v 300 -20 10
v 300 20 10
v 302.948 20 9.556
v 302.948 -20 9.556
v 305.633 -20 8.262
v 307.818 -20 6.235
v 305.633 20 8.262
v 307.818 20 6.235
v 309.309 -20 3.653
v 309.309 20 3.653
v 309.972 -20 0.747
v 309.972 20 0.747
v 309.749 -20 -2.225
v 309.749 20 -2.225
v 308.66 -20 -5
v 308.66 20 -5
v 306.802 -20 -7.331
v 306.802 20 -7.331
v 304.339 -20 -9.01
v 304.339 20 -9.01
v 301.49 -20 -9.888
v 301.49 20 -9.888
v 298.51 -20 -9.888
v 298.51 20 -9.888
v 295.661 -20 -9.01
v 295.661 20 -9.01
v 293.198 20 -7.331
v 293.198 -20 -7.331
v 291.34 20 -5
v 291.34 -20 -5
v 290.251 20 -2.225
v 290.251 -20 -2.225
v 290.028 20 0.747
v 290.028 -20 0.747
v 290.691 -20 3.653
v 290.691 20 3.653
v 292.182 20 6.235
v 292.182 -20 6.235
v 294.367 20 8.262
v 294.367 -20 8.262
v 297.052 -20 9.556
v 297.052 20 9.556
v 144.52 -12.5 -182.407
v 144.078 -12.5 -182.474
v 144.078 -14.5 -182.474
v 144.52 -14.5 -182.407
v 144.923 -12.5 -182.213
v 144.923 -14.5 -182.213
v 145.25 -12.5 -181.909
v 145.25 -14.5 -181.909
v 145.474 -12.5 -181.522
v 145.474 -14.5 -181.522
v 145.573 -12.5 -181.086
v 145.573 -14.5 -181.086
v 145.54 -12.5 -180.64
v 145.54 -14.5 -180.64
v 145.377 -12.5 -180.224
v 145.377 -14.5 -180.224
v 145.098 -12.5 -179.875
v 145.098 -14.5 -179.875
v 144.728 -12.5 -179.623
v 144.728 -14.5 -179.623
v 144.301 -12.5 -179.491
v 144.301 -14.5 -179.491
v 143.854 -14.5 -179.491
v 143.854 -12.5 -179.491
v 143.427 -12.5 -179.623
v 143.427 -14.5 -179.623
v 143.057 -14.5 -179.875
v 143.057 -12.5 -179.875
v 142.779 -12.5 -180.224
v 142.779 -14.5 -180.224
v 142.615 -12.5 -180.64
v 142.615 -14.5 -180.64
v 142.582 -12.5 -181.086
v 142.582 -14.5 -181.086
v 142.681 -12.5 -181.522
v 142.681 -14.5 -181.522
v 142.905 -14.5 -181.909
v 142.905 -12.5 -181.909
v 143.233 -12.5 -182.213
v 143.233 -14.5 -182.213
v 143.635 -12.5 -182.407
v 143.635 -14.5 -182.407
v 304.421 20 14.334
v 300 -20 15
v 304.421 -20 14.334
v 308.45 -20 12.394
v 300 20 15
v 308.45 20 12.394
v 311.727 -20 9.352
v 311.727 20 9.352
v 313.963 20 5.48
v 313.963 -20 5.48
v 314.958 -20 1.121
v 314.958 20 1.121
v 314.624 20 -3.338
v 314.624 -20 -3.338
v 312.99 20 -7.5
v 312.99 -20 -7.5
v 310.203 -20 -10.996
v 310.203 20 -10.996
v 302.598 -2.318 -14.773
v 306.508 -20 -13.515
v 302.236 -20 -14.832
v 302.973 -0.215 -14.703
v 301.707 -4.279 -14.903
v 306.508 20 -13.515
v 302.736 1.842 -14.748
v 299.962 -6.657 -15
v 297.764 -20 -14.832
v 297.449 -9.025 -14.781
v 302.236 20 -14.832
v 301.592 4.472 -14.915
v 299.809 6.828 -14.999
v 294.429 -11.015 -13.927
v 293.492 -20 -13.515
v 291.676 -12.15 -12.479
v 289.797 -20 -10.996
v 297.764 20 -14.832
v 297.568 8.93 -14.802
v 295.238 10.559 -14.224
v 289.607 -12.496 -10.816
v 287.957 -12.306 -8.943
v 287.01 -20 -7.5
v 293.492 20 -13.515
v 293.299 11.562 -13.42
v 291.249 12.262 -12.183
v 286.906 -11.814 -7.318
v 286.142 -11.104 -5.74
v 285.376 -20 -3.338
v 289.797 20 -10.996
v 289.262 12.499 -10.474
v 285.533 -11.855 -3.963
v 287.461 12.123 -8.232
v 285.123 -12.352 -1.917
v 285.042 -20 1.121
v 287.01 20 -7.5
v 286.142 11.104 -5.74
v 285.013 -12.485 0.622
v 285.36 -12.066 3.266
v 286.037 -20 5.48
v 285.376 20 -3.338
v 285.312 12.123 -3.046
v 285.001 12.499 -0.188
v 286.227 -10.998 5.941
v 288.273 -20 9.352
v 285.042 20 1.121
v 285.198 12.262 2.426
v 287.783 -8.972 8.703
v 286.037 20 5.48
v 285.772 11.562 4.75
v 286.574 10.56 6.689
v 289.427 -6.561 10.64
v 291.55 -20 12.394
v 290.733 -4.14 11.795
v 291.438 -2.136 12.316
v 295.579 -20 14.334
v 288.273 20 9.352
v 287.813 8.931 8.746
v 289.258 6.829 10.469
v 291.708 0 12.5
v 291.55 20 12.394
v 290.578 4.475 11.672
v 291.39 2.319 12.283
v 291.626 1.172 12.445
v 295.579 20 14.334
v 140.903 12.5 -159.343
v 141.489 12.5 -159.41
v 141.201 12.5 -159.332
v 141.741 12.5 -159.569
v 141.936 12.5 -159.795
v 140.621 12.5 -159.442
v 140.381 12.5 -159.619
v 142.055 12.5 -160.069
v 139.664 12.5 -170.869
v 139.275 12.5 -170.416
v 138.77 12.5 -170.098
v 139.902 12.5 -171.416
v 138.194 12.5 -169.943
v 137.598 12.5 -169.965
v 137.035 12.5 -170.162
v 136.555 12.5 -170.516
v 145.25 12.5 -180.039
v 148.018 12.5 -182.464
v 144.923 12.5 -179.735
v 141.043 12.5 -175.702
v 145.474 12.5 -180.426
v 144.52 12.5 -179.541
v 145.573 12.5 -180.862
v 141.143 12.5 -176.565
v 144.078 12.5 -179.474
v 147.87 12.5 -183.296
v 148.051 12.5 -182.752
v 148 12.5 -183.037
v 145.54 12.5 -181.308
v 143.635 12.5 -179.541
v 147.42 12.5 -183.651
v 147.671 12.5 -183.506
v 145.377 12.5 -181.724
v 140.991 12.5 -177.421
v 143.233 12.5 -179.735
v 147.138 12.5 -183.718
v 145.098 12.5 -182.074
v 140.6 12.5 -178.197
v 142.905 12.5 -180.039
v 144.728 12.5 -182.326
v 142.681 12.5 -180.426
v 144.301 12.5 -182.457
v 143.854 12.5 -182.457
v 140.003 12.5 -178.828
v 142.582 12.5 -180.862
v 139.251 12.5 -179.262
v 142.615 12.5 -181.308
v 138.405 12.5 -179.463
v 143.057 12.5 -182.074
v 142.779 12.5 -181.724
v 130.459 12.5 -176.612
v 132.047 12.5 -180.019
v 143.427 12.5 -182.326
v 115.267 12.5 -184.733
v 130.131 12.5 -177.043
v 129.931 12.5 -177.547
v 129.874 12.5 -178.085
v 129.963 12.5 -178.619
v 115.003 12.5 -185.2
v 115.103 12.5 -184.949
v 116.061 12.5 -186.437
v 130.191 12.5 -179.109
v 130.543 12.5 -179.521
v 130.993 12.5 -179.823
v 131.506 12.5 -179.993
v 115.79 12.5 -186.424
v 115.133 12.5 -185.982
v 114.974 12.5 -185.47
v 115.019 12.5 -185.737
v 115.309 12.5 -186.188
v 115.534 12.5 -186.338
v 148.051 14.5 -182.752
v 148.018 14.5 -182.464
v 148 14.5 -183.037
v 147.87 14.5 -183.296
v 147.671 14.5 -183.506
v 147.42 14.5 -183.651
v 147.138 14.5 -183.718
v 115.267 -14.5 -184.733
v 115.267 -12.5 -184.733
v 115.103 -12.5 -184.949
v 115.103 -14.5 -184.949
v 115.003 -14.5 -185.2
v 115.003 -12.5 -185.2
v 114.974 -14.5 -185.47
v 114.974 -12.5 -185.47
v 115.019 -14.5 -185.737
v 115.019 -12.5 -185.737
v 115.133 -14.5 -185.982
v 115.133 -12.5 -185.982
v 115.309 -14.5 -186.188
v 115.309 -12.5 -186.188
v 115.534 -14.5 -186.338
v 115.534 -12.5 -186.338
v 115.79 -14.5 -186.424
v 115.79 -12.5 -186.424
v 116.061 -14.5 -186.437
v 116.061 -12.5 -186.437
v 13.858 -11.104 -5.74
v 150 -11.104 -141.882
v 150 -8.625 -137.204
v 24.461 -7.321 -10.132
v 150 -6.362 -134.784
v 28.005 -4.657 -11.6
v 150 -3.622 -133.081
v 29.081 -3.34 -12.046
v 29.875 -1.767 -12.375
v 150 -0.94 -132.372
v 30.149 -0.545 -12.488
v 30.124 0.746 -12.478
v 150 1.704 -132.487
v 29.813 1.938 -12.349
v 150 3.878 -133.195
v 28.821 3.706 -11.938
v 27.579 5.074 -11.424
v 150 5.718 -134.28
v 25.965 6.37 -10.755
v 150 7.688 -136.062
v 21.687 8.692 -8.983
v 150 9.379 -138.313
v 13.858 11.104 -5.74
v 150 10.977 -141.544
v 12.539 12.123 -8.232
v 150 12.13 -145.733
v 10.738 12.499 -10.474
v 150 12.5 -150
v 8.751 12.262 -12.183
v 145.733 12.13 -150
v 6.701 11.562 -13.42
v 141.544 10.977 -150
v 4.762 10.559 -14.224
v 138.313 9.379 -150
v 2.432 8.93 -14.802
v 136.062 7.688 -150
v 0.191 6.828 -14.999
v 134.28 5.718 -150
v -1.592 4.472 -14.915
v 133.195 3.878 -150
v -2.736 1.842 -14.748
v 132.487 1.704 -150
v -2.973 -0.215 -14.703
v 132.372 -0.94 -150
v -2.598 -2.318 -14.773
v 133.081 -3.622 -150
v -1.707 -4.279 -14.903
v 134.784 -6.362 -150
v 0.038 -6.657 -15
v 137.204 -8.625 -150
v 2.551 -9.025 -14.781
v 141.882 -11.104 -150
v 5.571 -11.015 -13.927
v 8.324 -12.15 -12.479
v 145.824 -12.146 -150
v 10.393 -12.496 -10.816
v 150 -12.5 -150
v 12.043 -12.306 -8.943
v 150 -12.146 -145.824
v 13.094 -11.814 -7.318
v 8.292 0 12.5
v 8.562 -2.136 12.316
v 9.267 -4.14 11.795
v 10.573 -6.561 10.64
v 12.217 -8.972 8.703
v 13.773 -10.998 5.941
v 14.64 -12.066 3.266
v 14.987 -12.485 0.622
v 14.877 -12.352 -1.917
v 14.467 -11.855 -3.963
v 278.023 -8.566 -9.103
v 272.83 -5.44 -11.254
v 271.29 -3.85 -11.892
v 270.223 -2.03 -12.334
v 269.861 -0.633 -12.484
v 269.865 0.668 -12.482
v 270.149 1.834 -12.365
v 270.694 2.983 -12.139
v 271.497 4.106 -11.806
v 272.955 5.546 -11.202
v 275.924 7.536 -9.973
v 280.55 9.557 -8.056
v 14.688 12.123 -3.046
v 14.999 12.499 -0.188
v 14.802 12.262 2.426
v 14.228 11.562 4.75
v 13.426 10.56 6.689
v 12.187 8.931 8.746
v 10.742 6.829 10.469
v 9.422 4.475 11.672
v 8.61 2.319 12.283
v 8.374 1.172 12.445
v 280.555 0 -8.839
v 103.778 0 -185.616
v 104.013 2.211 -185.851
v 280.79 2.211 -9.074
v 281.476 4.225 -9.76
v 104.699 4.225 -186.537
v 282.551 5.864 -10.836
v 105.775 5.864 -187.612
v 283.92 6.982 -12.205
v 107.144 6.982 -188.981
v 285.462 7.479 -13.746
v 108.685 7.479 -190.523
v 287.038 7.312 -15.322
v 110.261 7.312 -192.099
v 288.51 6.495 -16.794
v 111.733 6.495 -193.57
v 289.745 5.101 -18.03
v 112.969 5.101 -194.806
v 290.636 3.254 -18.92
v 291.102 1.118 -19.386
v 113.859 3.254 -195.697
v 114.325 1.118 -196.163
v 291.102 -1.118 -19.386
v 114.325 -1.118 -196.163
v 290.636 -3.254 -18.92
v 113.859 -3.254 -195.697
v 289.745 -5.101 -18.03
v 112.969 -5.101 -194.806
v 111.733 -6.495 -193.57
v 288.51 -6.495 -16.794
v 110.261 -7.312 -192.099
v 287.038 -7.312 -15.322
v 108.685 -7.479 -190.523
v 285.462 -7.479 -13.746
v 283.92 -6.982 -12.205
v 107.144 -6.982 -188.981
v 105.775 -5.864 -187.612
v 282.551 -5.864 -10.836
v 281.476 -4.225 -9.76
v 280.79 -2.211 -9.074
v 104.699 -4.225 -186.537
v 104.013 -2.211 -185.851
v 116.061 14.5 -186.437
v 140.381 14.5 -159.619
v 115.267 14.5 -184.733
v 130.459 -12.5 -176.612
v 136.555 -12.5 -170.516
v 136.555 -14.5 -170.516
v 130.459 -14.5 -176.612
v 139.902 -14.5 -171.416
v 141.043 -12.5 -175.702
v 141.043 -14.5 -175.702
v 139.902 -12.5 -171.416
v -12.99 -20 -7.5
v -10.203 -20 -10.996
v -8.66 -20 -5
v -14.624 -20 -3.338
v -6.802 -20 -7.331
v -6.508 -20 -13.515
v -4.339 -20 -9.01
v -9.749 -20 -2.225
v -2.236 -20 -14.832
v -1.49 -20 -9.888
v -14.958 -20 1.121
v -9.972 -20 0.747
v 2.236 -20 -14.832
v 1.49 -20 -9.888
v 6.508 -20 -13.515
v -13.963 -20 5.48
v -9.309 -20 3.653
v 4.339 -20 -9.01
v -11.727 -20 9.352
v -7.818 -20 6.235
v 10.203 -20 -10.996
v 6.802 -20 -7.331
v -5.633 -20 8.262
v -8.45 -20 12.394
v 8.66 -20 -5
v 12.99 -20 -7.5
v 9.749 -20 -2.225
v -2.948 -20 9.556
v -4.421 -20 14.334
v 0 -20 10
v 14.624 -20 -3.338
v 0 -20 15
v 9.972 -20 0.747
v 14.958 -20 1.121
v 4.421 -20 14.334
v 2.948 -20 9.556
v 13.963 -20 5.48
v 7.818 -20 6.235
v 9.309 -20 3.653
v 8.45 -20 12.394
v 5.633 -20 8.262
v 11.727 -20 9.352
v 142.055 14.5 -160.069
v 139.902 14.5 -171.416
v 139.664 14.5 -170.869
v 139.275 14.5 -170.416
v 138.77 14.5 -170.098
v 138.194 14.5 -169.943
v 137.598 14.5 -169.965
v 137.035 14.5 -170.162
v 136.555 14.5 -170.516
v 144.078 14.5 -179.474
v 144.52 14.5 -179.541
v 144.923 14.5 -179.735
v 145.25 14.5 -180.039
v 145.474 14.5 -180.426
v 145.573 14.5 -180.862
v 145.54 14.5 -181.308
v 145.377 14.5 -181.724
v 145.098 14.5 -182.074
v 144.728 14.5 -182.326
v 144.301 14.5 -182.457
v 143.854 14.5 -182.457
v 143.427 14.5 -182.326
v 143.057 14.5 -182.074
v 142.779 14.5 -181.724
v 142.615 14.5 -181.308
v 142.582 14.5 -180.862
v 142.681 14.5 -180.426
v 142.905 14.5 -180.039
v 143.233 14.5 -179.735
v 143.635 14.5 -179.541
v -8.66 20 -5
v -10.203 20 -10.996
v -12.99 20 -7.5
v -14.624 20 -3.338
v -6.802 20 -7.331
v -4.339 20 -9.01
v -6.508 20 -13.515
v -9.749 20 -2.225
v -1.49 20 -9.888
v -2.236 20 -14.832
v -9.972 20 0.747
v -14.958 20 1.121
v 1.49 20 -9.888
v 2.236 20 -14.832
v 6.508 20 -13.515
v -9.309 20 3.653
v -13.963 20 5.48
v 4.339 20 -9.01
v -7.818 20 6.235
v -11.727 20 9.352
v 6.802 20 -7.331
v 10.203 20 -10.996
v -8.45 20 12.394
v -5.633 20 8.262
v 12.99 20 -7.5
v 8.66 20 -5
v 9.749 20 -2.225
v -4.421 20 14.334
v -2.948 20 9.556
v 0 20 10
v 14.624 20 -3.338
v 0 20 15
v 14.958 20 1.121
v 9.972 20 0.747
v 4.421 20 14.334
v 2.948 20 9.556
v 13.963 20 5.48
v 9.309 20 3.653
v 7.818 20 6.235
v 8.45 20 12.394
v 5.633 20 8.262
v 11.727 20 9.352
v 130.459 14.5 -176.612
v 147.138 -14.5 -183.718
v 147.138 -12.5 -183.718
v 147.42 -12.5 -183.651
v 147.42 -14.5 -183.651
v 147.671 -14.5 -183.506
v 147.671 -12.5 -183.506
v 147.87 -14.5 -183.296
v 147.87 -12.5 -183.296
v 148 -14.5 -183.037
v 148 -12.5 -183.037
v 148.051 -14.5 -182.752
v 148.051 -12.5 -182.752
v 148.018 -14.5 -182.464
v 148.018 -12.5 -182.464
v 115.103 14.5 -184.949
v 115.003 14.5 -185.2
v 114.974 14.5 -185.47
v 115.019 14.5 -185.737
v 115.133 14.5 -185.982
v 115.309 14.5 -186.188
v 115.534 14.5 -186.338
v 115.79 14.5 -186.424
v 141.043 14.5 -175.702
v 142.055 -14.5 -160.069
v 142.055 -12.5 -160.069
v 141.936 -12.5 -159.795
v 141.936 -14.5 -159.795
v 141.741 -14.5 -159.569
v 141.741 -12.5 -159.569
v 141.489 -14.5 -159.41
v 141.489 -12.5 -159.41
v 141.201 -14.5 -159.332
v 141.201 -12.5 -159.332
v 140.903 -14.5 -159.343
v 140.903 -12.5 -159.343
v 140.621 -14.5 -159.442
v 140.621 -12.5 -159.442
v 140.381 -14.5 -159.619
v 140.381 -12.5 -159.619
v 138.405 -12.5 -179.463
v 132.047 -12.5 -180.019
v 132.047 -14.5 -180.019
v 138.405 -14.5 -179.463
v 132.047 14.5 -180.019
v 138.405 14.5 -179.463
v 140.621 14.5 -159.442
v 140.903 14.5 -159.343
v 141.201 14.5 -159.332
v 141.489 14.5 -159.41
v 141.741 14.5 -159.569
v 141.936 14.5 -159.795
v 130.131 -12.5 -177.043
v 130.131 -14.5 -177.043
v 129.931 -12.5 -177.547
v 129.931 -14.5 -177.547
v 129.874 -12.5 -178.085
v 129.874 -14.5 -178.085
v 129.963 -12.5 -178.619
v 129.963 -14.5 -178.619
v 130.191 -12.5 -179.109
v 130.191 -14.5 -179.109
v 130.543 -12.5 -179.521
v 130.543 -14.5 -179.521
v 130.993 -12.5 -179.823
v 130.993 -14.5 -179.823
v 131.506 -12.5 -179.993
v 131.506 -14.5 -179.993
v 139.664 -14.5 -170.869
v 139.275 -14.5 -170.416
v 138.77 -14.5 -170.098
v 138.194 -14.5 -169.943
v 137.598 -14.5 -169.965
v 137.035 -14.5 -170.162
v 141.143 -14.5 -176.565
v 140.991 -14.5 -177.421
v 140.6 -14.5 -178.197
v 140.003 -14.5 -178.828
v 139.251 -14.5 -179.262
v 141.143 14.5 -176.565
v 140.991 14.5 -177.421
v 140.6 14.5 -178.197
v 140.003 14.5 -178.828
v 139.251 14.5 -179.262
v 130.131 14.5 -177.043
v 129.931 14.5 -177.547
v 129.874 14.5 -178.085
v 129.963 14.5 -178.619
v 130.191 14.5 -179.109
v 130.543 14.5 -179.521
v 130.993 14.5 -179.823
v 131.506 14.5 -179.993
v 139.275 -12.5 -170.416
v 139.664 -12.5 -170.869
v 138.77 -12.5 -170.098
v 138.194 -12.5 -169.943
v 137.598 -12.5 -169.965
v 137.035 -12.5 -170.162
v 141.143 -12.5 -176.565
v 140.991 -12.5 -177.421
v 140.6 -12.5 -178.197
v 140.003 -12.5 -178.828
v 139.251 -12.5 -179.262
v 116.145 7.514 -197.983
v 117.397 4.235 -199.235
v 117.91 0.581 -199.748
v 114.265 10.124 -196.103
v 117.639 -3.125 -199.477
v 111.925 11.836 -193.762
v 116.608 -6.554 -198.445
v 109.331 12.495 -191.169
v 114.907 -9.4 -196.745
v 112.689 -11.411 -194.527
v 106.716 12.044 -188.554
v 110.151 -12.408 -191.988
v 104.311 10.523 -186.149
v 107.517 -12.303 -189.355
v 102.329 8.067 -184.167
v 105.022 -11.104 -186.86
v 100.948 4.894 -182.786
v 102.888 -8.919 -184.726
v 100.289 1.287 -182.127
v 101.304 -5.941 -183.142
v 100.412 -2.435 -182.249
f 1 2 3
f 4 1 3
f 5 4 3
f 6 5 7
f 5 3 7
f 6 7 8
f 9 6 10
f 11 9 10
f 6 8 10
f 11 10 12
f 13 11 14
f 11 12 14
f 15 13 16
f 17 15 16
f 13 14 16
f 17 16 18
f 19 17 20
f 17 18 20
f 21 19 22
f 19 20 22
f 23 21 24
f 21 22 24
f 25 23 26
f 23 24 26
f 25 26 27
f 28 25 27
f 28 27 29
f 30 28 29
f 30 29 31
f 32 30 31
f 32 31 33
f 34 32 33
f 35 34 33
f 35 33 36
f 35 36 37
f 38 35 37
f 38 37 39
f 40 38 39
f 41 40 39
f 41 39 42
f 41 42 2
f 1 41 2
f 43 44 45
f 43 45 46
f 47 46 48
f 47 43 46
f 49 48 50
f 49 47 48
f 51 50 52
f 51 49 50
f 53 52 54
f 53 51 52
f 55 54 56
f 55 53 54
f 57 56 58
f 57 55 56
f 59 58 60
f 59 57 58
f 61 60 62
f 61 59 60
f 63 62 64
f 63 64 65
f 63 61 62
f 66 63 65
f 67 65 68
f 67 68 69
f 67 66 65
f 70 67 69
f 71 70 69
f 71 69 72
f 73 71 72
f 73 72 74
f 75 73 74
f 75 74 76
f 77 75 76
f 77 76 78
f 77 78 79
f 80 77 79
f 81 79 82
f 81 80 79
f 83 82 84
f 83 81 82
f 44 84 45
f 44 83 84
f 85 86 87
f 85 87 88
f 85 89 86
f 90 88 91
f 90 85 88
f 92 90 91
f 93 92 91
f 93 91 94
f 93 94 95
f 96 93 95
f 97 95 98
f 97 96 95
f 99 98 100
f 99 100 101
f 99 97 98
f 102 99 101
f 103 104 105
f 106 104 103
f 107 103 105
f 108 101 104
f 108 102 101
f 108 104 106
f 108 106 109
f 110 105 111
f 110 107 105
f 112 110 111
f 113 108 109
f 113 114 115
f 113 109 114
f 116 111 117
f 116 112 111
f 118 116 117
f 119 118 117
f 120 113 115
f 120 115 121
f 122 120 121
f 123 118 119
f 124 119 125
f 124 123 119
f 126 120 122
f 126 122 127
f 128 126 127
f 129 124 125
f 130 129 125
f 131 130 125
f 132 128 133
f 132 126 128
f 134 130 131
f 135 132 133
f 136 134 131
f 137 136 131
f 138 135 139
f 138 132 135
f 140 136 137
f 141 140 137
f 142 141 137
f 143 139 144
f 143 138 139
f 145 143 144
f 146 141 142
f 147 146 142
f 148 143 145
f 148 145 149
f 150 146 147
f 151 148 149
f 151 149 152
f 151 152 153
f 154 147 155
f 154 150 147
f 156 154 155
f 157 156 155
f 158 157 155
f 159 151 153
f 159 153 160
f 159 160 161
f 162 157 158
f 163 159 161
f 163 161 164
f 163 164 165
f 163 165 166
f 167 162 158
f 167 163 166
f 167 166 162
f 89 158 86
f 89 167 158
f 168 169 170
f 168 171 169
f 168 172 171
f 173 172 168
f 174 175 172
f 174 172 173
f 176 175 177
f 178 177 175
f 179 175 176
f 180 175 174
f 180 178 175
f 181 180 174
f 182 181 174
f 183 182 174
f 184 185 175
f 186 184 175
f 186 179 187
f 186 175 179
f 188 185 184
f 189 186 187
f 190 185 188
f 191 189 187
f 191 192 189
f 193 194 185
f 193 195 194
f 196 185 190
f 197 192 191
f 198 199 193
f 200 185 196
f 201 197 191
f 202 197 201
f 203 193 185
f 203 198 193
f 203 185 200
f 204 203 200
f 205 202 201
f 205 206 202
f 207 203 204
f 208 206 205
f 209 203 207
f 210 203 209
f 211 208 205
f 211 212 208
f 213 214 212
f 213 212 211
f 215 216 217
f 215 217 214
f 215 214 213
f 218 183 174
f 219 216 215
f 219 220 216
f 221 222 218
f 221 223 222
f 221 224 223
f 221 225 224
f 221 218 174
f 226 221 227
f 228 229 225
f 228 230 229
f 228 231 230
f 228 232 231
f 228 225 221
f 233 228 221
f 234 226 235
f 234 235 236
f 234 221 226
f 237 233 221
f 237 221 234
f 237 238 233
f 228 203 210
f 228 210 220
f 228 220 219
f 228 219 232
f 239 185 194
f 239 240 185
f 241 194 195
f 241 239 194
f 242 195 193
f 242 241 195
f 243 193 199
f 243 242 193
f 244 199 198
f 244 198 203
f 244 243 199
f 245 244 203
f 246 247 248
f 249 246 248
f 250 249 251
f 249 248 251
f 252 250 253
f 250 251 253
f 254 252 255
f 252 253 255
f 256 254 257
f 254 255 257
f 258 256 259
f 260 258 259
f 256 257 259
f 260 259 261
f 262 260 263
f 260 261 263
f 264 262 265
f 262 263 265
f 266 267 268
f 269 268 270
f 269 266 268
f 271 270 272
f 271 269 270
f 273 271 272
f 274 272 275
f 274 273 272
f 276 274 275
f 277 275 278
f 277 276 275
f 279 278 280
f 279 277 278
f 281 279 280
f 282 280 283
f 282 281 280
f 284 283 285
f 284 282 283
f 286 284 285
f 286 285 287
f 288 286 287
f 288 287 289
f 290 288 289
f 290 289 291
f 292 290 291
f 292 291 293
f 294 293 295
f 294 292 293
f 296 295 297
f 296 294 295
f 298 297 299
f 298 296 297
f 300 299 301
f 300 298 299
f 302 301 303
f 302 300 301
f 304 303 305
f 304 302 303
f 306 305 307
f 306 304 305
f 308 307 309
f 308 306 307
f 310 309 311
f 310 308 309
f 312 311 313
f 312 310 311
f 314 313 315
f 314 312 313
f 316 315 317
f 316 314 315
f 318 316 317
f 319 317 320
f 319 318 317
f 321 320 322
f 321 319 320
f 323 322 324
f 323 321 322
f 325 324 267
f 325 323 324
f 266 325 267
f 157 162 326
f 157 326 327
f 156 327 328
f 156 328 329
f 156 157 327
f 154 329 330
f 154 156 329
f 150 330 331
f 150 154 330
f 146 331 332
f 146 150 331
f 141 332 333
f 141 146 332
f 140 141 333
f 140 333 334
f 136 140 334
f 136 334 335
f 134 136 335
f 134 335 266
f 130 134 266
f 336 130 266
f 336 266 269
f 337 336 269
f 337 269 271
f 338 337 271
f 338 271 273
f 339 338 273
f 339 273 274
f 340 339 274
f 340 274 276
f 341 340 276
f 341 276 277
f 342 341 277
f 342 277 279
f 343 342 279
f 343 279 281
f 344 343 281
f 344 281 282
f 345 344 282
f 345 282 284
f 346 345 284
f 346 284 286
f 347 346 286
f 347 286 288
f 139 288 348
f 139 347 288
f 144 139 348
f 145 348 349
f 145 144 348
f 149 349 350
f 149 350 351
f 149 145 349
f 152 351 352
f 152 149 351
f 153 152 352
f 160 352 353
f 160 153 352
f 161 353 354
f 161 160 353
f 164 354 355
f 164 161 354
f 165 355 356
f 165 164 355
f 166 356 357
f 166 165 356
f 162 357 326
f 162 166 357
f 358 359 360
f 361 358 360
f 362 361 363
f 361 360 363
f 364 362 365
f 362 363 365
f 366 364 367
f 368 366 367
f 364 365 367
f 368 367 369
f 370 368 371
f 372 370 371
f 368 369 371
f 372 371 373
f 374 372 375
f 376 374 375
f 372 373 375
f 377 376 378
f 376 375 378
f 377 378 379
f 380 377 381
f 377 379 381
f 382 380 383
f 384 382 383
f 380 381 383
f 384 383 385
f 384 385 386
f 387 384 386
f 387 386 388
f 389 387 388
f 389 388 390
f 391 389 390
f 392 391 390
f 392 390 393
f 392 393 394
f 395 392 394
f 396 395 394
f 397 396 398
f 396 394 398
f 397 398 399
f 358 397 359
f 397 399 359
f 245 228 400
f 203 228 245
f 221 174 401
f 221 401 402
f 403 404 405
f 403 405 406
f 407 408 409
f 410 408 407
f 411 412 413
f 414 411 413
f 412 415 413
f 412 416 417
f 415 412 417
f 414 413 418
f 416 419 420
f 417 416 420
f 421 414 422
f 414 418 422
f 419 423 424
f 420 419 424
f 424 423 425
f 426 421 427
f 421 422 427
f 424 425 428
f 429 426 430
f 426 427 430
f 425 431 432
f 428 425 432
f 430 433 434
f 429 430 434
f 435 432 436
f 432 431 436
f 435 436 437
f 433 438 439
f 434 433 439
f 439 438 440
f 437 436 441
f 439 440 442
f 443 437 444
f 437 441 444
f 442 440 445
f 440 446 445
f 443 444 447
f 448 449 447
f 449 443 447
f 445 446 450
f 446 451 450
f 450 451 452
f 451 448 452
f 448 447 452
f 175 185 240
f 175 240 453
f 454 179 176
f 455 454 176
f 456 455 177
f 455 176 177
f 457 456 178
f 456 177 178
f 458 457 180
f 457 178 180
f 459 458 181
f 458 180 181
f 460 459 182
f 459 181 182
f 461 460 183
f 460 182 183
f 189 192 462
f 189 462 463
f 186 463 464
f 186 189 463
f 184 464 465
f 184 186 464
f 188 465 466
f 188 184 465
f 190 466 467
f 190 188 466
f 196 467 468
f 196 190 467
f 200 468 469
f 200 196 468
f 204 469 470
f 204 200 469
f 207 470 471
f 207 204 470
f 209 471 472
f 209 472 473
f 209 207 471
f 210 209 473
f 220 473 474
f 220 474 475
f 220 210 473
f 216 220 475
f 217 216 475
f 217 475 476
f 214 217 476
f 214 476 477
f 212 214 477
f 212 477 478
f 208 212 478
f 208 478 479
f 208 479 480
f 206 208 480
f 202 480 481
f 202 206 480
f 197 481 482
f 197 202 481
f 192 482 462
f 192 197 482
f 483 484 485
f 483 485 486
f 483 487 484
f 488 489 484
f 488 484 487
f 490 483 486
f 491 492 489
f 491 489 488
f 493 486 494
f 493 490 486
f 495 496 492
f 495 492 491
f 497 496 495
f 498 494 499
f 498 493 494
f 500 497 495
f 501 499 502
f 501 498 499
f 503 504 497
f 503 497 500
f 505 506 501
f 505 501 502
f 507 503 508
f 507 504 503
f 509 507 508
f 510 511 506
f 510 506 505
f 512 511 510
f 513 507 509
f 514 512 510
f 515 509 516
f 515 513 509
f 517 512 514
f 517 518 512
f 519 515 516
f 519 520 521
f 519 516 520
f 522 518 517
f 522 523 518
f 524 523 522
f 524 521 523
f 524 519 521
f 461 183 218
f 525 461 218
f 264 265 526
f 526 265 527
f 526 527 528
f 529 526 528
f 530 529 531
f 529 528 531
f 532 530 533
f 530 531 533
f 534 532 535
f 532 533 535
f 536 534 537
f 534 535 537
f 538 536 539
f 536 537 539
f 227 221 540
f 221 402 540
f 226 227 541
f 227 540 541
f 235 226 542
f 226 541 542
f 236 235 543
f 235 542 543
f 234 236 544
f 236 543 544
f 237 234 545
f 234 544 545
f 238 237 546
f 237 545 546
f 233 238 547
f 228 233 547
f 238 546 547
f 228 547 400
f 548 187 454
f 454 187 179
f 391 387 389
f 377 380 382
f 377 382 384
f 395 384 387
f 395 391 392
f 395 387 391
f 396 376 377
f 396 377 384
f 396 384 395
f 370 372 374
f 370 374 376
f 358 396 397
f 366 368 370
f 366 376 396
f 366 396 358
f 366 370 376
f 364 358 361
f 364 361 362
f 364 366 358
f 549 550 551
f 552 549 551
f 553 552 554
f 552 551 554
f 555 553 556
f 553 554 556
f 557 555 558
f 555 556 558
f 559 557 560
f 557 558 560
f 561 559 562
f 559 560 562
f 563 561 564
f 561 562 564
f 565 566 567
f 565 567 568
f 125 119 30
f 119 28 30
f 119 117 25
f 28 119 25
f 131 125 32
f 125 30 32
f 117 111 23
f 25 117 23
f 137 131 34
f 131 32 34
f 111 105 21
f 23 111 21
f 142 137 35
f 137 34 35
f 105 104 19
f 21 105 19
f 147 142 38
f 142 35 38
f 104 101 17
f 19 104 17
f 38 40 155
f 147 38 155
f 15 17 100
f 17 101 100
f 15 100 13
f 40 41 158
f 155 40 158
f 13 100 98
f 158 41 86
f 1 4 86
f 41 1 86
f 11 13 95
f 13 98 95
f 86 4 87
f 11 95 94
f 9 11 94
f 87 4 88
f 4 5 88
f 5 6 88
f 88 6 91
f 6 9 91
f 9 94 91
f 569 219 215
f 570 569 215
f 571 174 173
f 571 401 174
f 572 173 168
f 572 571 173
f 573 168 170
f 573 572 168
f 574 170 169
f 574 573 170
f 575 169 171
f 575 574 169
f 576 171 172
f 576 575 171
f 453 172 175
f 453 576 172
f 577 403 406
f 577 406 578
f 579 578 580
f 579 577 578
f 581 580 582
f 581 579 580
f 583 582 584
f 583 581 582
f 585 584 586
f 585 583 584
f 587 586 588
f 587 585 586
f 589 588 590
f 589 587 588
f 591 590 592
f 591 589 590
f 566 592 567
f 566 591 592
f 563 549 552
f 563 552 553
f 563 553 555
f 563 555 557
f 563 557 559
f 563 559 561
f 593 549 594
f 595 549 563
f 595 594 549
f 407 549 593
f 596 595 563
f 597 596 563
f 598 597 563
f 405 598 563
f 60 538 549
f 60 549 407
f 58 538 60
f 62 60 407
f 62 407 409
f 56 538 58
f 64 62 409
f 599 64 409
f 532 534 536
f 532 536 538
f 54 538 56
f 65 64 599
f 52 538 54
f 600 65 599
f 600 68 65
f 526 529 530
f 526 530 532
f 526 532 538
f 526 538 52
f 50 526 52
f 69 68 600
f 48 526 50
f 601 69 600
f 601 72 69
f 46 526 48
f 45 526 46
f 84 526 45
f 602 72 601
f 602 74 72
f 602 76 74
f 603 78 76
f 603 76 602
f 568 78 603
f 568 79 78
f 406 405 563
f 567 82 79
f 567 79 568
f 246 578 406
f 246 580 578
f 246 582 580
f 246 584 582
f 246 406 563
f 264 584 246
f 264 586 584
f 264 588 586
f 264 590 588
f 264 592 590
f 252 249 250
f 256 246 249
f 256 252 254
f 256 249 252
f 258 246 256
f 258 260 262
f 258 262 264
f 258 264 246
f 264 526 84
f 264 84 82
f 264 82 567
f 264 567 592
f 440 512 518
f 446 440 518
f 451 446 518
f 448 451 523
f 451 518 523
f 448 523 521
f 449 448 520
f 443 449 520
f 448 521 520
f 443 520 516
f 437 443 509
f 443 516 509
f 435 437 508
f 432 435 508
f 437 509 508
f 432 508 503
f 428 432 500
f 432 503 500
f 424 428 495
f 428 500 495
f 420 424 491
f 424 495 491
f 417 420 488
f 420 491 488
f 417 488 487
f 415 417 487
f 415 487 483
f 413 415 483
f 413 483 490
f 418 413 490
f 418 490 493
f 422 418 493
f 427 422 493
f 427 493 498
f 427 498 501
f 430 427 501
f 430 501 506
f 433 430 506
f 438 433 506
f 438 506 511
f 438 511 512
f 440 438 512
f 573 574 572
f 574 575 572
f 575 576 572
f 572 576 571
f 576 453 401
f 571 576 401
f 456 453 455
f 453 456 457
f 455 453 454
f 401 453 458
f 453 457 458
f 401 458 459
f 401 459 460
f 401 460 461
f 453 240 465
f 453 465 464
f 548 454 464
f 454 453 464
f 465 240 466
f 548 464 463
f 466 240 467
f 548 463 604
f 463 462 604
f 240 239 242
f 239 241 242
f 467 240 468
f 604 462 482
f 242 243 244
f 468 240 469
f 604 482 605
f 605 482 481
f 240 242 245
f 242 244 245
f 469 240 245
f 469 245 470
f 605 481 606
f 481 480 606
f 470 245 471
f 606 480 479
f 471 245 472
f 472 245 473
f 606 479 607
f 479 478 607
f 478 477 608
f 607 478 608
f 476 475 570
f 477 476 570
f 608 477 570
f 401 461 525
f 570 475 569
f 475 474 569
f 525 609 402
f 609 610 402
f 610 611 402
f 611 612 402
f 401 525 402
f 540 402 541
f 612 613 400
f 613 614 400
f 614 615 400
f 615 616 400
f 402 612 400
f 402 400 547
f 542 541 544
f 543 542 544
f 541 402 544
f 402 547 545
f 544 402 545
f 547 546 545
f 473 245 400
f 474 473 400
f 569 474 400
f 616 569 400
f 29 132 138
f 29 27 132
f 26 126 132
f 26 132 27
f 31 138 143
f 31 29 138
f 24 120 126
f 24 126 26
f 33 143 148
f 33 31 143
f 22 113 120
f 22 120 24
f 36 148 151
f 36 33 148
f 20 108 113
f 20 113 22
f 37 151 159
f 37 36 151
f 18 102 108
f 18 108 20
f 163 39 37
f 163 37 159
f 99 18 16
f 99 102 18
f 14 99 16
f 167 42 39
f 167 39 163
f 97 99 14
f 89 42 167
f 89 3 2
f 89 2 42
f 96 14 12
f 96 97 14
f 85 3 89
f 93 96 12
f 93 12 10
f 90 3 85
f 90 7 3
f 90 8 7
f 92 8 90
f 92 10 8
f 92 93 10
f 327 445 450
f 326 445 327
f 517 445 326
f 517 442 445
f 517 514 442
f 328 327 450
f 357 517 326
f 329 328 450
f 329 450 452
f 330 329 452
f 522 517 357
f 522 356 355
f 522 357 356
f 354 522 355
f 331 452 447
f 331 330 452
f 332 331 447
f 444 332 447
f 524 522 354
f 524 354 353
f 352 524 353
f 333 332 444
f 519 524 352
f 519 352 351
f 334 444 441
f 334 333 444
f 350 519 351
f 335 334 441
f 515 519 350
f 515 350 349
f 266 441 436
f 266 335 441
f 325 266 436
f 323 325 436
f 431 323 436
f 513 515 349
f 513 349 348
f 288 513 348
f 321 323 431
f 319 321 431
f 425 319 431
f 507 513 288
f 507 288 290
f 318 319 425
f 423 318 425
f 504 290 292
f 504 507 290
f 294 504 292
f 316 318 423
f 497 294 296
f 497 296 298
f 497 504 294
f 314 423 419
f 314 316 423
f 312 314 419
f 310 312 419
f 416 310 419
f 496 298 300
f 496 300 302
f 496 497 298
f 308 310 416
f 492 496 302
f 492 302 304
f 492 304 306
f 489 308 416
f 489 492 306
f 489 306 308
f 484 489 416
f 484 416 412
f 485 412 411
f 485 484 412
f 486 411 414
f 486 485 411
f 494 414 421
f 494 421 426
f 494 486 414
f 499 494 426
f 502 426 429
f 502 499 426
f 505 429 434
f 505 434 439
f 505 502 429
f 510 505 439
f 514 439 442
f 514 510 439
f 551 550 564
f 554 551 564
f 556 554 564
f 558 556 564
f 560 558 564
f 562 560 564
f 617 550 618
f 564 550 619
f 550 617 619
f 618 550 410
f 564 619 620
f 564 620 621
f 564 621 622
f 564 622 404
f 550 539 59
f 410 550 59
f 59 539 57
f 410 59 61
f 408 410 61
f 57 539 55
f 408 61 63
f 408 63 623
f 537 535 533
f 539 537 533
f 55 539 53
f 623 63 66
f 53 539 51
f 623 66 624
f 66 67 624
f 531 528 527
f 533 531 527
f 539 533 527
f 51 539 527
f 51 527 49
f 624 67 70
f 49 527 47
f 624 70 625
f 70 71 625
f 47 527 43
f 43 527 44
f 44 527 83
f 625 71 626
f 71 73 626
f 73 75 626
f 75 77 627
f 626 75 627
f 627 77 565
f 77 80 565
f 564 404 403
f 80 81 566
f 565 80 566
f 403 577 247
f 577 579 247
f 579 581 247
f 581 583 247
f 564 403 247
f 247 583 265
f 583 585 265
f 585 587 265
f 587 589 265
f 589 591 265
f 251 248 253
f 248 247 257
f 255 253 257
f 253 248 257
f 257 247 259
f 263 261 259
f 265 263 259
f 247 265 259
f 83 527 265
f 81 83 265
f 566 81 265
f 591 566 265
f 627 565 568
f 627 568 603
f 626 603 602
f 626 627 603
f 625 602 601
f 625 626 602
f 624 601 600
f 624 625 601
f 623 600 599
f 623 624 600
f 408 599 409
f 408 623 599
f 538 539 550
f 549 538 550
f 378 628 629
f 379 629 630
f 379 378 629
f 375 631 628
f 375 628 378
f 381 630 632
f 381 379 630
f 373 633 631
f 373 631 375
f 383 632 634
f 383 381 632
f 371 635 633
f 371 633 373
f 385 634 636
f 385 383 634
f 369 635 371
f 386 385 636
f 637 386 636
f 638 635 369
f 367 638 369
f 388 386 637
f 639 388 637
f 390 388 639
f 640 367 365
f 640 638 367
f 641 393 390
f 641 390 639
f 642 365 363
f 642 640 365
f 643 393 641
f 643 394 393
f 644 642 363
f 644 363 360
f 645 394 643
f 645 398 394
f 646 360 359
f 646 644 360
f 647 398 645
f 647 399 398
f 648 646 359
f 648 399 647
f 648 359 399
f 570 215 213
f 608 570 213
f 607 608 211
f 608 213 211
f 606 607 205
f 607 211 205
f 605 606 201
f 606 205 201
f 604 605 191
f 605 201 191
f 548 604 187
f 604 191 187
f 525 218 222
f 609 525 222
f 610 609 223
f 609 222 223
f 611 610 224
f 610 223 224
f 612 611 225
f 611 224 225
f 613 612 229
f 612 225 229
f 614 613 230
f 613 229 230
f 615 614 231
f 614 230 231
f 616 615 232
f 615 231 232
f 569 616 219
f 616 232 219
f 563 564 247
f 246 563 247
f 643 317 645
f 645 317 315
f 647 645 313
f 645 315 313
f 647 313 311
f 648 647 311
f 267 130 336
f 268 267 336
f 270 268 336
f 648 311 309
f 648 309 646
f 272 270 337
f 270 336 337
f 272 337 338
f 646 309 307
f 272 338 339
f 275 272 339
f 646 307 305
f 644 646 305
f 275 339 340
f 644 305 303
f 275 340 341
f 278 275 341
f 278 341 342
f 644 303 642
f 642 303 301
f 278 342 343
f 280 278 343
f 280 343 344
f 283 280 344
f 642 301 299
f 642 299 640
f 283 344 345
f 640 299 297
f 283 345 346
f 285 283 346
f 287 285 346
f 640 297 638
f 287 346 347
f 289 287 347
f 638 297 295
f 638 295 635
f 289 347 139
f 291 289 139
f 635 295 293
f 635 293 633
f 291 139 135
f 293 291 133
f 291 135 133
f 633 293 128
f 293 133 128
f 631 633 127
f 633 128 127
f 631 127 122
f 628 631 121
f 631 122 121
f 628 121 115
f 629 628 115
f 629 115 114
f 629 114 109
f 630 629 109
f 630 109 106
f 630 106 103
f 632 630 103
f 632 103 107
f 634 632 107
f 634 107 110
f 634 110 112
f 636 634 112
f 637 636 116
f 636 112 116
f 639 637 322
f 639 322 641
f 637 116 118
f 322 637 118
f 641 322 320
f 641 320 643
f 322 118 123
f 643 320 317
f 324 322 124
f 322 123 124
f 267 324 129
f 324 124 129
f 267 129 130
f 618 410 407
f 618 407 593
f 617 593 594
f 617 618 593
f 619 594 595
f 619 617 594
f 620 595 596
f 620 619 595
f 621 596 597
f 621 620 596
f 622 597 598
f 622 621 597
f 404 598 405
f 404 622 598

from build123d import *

# Parameters (mm, degrees)
CROQUIS1_R              = 15
SALIENTE_EXTRUIR1_DEPTH = 20
CROQUIS9_R              = 15
SALIENTE_EXTRUIR5_DEPTH = 20
CROQUIS10_W             = 300
CROQUIS10_H             = 12.5
CROQUIS12_R             = 12.5
SALIENTE_EXTRUIR6_DEPTH = 270
CROQUIS18_R             = 10
CORTAR_EXTRUIR1_DEPTH   = 376.137474949
CROQUIS19_R             = 1.5
SALIENTE_EXTRUIR7_DEPTH = 2
REDONDEO1_R             = 1
CROQUIS20_R             = 1.5
SALIENTE_EXTRUIR8_DEPTH = 2
CROQUIS21_R             = 7.5
CORTAR_EXTRUIR2_DEPTH   = 250


with BuildPart() as part:
    # Croquis1 → Saliente-Extruir1 (new, symmetric)
    with BuildSketch(Plane(origin=(0, 0, 0), x_dir=(1, 0, 0), z_dir=(0, 1, 0))):
        with Locations(Location((0, 0, 0), (0, 0, 270))):
            Circle(CROQUIS1_R)
    extrude(amount=SALIENTE_EXTRUIR1_DEPTH, both=True)



with BuildPart() as body_2:
    # Croquis9 → Saliente-Extruir5 (new, symmetric)
    with BuildSketch(Plane(origin=(0, 0, 0), x_dir=(1, 0, 0), z_dir=(0, 1, 0))):
        with Locations(Location((300, 0, 0), (0, 0, 270))):
            Circle(CROQUIS9_R)
    extrude(amount=SALIENTE_EXTRUIR5_DEPTH, both=True)


with BuildPart() as part_1:
    add(part.part)

    add(body_2.part)  # Revolución1 merges body 2
    # Croquis10 → Revolución1 (revolve)
    with BuildSketch(Plane.XY, mode=Mode.PRIVATE) as revoluci_n1_sk:
        with Locations((150, 6.25)):
            Rectangle(CROQUIS10_W, CROQUIS10_H)
    revolve(revoluci_n1_sk.sketch.rotate(Axis((0, 0, 0), (1, 0, 0)), 90), axis=Axis((0, 0, 0), (1, 0, 0)))

    # Croquis12 → Saliente-Extruir6 (add)
    with BuildSketch(Plane(origin=(150, 0, 150), x_dir=(-0.7071067811865456, 0, 0.7071067811865495), z_dir=(-0.7071067811865495, 0, -0.7071067811865456))):
        with Locations(Location((-212.132034356, 0, 0), (0, 0, 297.336794427))):
            Circle(CROQUIS12_R)
    extrude(amount=SALIENTE_EXTRUIR6_DEPTH)

    # Croquis17 → Revolución2 (revolve)
    with BuildSketch(Plane(origin=(0, 0, 0), x_dir=(1, 0, 0), z_dir=(0, 1, 0)), mode=Mode.PRIVATE) as revoluci_n2_sk:
        Polygon((-8.838834765, 8.838834765), (0, 0), (150, 150), (141.161165235, 158.838834765), align=None)
    revolve(revoluci_n2_sk.sketch.rotate(Axis((150, 0, -150), (-0.7071067811865455, 0, 0.7071067811865497)), 117.336794427), axis=Axis((150, 0, -150), (-0.7071067811865455, 0, 0.7071067811865497)))

    # Croquis18 → Cortar-Extruir1 (cut, through all)
    with BuildSketch(Plane(origin=(0, 20, 0), x_dir=(1, 0, 0), z_dir=(0, 1, 0))):
        with Locations(Location((0, 0, 0), (0, 0, 270))):
            Circle(CROQUIS18_R)
        with Locations(Location((300, 0, 0), (0, 0, 270))):
            Circle(CROQUIS18_R)
    extrude(amount=-CORTAR_EXTRUIR1_DEPTH, mode=Mode.SUBTRACT)

    # Croquis21 → Cortar-Extruir2 (cut)
    with BuildSketch(Plane(origin=(-40.91883092, 0, -40.91883092), x_dir=(-0.7071067811865456, 0, 0.7071067811865495), z_dir=(-0.7071067811865495, 0, -0.7071067811865456))):
        with Locations((-212.132034356, 0)):
            Circle(CROQUIS21_R)
    extrude(amount=-CORTAR_EXTRUIR2_DEPTH, mode=Mode.SUBTRACT)


with BuildPart() as body_2_2:
    # Croquis19 → Saliente-Extruir7 (new body)
    with BuildSketch(Plane(origin=(0, 12.5, 0), x_dir=(1, 0, 0), z_dir=(0, 1, 0))):
        Polygon((141.608081014, 158.391918986), (113.323809767, 186.676190233), (148.323809767, 183.61408701), align=None)
        with Locations(Location((144.077563746, 180.974125887, 0), (0, 0, 270))):
            Circle(CROQUIS19_R, mode=Mode.SUBTRACT)
        with BuildLine():
            Line((132.047188122, 180.019007697), (138.405447562, 179.462732076))
            ThreePointArc((138.405447562, 179.462732076), (140.600081534, 178.196810716), (141.042976329, 175.702252769))
            Line((141.042976329, 175.702252769), (139.90167578, 171.415886345))
            ThreePointArc((139.90167578, 171.415886345), (138.488170033, 169.999039468), (136.55479822, 170.516269591))
            Line((136.55479822, 170.516269591), (130.458663074, 176.612404738))
            ThreePointArc((130.458663074, 176.612404738), (130.060261062, 178.871854824), (132.047188122, 180.019007697))
        make_face(mode=Mode.SUBTRACT)
    extrude(amount=SALIENTE_EXTRUIR7_DEPTH)

    # Redondeo1
    redondeo1_edges = [body_2_2.edges().sort_by_distance(p)[0] for p in [
        (113.323809767, 13.5, -186.676190233),
        (148.323809767, 13.5, -183.61408701),
        (141.608081014, 13.5, -158.391918986),
    ]]
    fillet(redondeo1_edges, radius=REDONDEO1_R)


with BuildPart() as body_3:
    # Croquis20 → Saliente-Extruir8 (new body)
    with BuildSketch(Plane(origin=(0, -12.5, 0), x_dir=(-1, 0, 0), z_dir=(0, -1, 0))):
        with BuildLine():
            Line((-116.060832205, 186.436731798), (-147.13848683, 183.717789329))
            ThreePointArc((-147.13848683, 183.717789329), (-147.870031487, 183.295815543), (-148.017663086, 182.464296227))
            Line((-148.017663086, 182.464296227), (-142.05454598, 160.068701177))
            ThreePointArc((-142.05454598, 160.068701177), (-141.347793106, 159.360277738), (-140.3811072, 159.6188928))
            Line((-140.3811072, 159.6188928), (-115.266569681, 184.733430319))
            ThreePointArc((-115.266569681, 184.733430319), (-115.067368675, 185.863155362), (-116.060832205, 186.436731798))
        make_face()
        with Locations(Location((-144.077563746, 180.974125887, 0), (0, 0, 90))):
            Circle(CROQUIS20_R, mode=Mode.SUBTRACT)
        with BuildLine():
            ThreePointArc((-130.458663074, 176.612404738), (-130.060261062, 178.871854824), (-132.047188122, 180.019007697))
            Line((-132.047188122, 180.019007697), (-138.405447562, 179.462732076))
            ThreePointArc((-138.405447562, 179.462732076), (-140.600081534, 178.196810716), (-141.042976329, 175.702252769))
            Line((-141.042976329, 175.702252769), (-139.90167578, 171.415886345))
            ThreePointArc((-139.90167578, 171.415886345), (-138.488170033, 169.999039468), (-136.55479822, 170.516269591))
            Line((-136.55479822, 170.516269591), (-130.458663074, 176.612404738))
        make_face(mode=Mode.SUBTRACT)
    extrude(amount=SALIENTE_EXTRUIR8_DEPTH)


solid = Compound([part_1.part, body_2_2.part, body_3.part])
